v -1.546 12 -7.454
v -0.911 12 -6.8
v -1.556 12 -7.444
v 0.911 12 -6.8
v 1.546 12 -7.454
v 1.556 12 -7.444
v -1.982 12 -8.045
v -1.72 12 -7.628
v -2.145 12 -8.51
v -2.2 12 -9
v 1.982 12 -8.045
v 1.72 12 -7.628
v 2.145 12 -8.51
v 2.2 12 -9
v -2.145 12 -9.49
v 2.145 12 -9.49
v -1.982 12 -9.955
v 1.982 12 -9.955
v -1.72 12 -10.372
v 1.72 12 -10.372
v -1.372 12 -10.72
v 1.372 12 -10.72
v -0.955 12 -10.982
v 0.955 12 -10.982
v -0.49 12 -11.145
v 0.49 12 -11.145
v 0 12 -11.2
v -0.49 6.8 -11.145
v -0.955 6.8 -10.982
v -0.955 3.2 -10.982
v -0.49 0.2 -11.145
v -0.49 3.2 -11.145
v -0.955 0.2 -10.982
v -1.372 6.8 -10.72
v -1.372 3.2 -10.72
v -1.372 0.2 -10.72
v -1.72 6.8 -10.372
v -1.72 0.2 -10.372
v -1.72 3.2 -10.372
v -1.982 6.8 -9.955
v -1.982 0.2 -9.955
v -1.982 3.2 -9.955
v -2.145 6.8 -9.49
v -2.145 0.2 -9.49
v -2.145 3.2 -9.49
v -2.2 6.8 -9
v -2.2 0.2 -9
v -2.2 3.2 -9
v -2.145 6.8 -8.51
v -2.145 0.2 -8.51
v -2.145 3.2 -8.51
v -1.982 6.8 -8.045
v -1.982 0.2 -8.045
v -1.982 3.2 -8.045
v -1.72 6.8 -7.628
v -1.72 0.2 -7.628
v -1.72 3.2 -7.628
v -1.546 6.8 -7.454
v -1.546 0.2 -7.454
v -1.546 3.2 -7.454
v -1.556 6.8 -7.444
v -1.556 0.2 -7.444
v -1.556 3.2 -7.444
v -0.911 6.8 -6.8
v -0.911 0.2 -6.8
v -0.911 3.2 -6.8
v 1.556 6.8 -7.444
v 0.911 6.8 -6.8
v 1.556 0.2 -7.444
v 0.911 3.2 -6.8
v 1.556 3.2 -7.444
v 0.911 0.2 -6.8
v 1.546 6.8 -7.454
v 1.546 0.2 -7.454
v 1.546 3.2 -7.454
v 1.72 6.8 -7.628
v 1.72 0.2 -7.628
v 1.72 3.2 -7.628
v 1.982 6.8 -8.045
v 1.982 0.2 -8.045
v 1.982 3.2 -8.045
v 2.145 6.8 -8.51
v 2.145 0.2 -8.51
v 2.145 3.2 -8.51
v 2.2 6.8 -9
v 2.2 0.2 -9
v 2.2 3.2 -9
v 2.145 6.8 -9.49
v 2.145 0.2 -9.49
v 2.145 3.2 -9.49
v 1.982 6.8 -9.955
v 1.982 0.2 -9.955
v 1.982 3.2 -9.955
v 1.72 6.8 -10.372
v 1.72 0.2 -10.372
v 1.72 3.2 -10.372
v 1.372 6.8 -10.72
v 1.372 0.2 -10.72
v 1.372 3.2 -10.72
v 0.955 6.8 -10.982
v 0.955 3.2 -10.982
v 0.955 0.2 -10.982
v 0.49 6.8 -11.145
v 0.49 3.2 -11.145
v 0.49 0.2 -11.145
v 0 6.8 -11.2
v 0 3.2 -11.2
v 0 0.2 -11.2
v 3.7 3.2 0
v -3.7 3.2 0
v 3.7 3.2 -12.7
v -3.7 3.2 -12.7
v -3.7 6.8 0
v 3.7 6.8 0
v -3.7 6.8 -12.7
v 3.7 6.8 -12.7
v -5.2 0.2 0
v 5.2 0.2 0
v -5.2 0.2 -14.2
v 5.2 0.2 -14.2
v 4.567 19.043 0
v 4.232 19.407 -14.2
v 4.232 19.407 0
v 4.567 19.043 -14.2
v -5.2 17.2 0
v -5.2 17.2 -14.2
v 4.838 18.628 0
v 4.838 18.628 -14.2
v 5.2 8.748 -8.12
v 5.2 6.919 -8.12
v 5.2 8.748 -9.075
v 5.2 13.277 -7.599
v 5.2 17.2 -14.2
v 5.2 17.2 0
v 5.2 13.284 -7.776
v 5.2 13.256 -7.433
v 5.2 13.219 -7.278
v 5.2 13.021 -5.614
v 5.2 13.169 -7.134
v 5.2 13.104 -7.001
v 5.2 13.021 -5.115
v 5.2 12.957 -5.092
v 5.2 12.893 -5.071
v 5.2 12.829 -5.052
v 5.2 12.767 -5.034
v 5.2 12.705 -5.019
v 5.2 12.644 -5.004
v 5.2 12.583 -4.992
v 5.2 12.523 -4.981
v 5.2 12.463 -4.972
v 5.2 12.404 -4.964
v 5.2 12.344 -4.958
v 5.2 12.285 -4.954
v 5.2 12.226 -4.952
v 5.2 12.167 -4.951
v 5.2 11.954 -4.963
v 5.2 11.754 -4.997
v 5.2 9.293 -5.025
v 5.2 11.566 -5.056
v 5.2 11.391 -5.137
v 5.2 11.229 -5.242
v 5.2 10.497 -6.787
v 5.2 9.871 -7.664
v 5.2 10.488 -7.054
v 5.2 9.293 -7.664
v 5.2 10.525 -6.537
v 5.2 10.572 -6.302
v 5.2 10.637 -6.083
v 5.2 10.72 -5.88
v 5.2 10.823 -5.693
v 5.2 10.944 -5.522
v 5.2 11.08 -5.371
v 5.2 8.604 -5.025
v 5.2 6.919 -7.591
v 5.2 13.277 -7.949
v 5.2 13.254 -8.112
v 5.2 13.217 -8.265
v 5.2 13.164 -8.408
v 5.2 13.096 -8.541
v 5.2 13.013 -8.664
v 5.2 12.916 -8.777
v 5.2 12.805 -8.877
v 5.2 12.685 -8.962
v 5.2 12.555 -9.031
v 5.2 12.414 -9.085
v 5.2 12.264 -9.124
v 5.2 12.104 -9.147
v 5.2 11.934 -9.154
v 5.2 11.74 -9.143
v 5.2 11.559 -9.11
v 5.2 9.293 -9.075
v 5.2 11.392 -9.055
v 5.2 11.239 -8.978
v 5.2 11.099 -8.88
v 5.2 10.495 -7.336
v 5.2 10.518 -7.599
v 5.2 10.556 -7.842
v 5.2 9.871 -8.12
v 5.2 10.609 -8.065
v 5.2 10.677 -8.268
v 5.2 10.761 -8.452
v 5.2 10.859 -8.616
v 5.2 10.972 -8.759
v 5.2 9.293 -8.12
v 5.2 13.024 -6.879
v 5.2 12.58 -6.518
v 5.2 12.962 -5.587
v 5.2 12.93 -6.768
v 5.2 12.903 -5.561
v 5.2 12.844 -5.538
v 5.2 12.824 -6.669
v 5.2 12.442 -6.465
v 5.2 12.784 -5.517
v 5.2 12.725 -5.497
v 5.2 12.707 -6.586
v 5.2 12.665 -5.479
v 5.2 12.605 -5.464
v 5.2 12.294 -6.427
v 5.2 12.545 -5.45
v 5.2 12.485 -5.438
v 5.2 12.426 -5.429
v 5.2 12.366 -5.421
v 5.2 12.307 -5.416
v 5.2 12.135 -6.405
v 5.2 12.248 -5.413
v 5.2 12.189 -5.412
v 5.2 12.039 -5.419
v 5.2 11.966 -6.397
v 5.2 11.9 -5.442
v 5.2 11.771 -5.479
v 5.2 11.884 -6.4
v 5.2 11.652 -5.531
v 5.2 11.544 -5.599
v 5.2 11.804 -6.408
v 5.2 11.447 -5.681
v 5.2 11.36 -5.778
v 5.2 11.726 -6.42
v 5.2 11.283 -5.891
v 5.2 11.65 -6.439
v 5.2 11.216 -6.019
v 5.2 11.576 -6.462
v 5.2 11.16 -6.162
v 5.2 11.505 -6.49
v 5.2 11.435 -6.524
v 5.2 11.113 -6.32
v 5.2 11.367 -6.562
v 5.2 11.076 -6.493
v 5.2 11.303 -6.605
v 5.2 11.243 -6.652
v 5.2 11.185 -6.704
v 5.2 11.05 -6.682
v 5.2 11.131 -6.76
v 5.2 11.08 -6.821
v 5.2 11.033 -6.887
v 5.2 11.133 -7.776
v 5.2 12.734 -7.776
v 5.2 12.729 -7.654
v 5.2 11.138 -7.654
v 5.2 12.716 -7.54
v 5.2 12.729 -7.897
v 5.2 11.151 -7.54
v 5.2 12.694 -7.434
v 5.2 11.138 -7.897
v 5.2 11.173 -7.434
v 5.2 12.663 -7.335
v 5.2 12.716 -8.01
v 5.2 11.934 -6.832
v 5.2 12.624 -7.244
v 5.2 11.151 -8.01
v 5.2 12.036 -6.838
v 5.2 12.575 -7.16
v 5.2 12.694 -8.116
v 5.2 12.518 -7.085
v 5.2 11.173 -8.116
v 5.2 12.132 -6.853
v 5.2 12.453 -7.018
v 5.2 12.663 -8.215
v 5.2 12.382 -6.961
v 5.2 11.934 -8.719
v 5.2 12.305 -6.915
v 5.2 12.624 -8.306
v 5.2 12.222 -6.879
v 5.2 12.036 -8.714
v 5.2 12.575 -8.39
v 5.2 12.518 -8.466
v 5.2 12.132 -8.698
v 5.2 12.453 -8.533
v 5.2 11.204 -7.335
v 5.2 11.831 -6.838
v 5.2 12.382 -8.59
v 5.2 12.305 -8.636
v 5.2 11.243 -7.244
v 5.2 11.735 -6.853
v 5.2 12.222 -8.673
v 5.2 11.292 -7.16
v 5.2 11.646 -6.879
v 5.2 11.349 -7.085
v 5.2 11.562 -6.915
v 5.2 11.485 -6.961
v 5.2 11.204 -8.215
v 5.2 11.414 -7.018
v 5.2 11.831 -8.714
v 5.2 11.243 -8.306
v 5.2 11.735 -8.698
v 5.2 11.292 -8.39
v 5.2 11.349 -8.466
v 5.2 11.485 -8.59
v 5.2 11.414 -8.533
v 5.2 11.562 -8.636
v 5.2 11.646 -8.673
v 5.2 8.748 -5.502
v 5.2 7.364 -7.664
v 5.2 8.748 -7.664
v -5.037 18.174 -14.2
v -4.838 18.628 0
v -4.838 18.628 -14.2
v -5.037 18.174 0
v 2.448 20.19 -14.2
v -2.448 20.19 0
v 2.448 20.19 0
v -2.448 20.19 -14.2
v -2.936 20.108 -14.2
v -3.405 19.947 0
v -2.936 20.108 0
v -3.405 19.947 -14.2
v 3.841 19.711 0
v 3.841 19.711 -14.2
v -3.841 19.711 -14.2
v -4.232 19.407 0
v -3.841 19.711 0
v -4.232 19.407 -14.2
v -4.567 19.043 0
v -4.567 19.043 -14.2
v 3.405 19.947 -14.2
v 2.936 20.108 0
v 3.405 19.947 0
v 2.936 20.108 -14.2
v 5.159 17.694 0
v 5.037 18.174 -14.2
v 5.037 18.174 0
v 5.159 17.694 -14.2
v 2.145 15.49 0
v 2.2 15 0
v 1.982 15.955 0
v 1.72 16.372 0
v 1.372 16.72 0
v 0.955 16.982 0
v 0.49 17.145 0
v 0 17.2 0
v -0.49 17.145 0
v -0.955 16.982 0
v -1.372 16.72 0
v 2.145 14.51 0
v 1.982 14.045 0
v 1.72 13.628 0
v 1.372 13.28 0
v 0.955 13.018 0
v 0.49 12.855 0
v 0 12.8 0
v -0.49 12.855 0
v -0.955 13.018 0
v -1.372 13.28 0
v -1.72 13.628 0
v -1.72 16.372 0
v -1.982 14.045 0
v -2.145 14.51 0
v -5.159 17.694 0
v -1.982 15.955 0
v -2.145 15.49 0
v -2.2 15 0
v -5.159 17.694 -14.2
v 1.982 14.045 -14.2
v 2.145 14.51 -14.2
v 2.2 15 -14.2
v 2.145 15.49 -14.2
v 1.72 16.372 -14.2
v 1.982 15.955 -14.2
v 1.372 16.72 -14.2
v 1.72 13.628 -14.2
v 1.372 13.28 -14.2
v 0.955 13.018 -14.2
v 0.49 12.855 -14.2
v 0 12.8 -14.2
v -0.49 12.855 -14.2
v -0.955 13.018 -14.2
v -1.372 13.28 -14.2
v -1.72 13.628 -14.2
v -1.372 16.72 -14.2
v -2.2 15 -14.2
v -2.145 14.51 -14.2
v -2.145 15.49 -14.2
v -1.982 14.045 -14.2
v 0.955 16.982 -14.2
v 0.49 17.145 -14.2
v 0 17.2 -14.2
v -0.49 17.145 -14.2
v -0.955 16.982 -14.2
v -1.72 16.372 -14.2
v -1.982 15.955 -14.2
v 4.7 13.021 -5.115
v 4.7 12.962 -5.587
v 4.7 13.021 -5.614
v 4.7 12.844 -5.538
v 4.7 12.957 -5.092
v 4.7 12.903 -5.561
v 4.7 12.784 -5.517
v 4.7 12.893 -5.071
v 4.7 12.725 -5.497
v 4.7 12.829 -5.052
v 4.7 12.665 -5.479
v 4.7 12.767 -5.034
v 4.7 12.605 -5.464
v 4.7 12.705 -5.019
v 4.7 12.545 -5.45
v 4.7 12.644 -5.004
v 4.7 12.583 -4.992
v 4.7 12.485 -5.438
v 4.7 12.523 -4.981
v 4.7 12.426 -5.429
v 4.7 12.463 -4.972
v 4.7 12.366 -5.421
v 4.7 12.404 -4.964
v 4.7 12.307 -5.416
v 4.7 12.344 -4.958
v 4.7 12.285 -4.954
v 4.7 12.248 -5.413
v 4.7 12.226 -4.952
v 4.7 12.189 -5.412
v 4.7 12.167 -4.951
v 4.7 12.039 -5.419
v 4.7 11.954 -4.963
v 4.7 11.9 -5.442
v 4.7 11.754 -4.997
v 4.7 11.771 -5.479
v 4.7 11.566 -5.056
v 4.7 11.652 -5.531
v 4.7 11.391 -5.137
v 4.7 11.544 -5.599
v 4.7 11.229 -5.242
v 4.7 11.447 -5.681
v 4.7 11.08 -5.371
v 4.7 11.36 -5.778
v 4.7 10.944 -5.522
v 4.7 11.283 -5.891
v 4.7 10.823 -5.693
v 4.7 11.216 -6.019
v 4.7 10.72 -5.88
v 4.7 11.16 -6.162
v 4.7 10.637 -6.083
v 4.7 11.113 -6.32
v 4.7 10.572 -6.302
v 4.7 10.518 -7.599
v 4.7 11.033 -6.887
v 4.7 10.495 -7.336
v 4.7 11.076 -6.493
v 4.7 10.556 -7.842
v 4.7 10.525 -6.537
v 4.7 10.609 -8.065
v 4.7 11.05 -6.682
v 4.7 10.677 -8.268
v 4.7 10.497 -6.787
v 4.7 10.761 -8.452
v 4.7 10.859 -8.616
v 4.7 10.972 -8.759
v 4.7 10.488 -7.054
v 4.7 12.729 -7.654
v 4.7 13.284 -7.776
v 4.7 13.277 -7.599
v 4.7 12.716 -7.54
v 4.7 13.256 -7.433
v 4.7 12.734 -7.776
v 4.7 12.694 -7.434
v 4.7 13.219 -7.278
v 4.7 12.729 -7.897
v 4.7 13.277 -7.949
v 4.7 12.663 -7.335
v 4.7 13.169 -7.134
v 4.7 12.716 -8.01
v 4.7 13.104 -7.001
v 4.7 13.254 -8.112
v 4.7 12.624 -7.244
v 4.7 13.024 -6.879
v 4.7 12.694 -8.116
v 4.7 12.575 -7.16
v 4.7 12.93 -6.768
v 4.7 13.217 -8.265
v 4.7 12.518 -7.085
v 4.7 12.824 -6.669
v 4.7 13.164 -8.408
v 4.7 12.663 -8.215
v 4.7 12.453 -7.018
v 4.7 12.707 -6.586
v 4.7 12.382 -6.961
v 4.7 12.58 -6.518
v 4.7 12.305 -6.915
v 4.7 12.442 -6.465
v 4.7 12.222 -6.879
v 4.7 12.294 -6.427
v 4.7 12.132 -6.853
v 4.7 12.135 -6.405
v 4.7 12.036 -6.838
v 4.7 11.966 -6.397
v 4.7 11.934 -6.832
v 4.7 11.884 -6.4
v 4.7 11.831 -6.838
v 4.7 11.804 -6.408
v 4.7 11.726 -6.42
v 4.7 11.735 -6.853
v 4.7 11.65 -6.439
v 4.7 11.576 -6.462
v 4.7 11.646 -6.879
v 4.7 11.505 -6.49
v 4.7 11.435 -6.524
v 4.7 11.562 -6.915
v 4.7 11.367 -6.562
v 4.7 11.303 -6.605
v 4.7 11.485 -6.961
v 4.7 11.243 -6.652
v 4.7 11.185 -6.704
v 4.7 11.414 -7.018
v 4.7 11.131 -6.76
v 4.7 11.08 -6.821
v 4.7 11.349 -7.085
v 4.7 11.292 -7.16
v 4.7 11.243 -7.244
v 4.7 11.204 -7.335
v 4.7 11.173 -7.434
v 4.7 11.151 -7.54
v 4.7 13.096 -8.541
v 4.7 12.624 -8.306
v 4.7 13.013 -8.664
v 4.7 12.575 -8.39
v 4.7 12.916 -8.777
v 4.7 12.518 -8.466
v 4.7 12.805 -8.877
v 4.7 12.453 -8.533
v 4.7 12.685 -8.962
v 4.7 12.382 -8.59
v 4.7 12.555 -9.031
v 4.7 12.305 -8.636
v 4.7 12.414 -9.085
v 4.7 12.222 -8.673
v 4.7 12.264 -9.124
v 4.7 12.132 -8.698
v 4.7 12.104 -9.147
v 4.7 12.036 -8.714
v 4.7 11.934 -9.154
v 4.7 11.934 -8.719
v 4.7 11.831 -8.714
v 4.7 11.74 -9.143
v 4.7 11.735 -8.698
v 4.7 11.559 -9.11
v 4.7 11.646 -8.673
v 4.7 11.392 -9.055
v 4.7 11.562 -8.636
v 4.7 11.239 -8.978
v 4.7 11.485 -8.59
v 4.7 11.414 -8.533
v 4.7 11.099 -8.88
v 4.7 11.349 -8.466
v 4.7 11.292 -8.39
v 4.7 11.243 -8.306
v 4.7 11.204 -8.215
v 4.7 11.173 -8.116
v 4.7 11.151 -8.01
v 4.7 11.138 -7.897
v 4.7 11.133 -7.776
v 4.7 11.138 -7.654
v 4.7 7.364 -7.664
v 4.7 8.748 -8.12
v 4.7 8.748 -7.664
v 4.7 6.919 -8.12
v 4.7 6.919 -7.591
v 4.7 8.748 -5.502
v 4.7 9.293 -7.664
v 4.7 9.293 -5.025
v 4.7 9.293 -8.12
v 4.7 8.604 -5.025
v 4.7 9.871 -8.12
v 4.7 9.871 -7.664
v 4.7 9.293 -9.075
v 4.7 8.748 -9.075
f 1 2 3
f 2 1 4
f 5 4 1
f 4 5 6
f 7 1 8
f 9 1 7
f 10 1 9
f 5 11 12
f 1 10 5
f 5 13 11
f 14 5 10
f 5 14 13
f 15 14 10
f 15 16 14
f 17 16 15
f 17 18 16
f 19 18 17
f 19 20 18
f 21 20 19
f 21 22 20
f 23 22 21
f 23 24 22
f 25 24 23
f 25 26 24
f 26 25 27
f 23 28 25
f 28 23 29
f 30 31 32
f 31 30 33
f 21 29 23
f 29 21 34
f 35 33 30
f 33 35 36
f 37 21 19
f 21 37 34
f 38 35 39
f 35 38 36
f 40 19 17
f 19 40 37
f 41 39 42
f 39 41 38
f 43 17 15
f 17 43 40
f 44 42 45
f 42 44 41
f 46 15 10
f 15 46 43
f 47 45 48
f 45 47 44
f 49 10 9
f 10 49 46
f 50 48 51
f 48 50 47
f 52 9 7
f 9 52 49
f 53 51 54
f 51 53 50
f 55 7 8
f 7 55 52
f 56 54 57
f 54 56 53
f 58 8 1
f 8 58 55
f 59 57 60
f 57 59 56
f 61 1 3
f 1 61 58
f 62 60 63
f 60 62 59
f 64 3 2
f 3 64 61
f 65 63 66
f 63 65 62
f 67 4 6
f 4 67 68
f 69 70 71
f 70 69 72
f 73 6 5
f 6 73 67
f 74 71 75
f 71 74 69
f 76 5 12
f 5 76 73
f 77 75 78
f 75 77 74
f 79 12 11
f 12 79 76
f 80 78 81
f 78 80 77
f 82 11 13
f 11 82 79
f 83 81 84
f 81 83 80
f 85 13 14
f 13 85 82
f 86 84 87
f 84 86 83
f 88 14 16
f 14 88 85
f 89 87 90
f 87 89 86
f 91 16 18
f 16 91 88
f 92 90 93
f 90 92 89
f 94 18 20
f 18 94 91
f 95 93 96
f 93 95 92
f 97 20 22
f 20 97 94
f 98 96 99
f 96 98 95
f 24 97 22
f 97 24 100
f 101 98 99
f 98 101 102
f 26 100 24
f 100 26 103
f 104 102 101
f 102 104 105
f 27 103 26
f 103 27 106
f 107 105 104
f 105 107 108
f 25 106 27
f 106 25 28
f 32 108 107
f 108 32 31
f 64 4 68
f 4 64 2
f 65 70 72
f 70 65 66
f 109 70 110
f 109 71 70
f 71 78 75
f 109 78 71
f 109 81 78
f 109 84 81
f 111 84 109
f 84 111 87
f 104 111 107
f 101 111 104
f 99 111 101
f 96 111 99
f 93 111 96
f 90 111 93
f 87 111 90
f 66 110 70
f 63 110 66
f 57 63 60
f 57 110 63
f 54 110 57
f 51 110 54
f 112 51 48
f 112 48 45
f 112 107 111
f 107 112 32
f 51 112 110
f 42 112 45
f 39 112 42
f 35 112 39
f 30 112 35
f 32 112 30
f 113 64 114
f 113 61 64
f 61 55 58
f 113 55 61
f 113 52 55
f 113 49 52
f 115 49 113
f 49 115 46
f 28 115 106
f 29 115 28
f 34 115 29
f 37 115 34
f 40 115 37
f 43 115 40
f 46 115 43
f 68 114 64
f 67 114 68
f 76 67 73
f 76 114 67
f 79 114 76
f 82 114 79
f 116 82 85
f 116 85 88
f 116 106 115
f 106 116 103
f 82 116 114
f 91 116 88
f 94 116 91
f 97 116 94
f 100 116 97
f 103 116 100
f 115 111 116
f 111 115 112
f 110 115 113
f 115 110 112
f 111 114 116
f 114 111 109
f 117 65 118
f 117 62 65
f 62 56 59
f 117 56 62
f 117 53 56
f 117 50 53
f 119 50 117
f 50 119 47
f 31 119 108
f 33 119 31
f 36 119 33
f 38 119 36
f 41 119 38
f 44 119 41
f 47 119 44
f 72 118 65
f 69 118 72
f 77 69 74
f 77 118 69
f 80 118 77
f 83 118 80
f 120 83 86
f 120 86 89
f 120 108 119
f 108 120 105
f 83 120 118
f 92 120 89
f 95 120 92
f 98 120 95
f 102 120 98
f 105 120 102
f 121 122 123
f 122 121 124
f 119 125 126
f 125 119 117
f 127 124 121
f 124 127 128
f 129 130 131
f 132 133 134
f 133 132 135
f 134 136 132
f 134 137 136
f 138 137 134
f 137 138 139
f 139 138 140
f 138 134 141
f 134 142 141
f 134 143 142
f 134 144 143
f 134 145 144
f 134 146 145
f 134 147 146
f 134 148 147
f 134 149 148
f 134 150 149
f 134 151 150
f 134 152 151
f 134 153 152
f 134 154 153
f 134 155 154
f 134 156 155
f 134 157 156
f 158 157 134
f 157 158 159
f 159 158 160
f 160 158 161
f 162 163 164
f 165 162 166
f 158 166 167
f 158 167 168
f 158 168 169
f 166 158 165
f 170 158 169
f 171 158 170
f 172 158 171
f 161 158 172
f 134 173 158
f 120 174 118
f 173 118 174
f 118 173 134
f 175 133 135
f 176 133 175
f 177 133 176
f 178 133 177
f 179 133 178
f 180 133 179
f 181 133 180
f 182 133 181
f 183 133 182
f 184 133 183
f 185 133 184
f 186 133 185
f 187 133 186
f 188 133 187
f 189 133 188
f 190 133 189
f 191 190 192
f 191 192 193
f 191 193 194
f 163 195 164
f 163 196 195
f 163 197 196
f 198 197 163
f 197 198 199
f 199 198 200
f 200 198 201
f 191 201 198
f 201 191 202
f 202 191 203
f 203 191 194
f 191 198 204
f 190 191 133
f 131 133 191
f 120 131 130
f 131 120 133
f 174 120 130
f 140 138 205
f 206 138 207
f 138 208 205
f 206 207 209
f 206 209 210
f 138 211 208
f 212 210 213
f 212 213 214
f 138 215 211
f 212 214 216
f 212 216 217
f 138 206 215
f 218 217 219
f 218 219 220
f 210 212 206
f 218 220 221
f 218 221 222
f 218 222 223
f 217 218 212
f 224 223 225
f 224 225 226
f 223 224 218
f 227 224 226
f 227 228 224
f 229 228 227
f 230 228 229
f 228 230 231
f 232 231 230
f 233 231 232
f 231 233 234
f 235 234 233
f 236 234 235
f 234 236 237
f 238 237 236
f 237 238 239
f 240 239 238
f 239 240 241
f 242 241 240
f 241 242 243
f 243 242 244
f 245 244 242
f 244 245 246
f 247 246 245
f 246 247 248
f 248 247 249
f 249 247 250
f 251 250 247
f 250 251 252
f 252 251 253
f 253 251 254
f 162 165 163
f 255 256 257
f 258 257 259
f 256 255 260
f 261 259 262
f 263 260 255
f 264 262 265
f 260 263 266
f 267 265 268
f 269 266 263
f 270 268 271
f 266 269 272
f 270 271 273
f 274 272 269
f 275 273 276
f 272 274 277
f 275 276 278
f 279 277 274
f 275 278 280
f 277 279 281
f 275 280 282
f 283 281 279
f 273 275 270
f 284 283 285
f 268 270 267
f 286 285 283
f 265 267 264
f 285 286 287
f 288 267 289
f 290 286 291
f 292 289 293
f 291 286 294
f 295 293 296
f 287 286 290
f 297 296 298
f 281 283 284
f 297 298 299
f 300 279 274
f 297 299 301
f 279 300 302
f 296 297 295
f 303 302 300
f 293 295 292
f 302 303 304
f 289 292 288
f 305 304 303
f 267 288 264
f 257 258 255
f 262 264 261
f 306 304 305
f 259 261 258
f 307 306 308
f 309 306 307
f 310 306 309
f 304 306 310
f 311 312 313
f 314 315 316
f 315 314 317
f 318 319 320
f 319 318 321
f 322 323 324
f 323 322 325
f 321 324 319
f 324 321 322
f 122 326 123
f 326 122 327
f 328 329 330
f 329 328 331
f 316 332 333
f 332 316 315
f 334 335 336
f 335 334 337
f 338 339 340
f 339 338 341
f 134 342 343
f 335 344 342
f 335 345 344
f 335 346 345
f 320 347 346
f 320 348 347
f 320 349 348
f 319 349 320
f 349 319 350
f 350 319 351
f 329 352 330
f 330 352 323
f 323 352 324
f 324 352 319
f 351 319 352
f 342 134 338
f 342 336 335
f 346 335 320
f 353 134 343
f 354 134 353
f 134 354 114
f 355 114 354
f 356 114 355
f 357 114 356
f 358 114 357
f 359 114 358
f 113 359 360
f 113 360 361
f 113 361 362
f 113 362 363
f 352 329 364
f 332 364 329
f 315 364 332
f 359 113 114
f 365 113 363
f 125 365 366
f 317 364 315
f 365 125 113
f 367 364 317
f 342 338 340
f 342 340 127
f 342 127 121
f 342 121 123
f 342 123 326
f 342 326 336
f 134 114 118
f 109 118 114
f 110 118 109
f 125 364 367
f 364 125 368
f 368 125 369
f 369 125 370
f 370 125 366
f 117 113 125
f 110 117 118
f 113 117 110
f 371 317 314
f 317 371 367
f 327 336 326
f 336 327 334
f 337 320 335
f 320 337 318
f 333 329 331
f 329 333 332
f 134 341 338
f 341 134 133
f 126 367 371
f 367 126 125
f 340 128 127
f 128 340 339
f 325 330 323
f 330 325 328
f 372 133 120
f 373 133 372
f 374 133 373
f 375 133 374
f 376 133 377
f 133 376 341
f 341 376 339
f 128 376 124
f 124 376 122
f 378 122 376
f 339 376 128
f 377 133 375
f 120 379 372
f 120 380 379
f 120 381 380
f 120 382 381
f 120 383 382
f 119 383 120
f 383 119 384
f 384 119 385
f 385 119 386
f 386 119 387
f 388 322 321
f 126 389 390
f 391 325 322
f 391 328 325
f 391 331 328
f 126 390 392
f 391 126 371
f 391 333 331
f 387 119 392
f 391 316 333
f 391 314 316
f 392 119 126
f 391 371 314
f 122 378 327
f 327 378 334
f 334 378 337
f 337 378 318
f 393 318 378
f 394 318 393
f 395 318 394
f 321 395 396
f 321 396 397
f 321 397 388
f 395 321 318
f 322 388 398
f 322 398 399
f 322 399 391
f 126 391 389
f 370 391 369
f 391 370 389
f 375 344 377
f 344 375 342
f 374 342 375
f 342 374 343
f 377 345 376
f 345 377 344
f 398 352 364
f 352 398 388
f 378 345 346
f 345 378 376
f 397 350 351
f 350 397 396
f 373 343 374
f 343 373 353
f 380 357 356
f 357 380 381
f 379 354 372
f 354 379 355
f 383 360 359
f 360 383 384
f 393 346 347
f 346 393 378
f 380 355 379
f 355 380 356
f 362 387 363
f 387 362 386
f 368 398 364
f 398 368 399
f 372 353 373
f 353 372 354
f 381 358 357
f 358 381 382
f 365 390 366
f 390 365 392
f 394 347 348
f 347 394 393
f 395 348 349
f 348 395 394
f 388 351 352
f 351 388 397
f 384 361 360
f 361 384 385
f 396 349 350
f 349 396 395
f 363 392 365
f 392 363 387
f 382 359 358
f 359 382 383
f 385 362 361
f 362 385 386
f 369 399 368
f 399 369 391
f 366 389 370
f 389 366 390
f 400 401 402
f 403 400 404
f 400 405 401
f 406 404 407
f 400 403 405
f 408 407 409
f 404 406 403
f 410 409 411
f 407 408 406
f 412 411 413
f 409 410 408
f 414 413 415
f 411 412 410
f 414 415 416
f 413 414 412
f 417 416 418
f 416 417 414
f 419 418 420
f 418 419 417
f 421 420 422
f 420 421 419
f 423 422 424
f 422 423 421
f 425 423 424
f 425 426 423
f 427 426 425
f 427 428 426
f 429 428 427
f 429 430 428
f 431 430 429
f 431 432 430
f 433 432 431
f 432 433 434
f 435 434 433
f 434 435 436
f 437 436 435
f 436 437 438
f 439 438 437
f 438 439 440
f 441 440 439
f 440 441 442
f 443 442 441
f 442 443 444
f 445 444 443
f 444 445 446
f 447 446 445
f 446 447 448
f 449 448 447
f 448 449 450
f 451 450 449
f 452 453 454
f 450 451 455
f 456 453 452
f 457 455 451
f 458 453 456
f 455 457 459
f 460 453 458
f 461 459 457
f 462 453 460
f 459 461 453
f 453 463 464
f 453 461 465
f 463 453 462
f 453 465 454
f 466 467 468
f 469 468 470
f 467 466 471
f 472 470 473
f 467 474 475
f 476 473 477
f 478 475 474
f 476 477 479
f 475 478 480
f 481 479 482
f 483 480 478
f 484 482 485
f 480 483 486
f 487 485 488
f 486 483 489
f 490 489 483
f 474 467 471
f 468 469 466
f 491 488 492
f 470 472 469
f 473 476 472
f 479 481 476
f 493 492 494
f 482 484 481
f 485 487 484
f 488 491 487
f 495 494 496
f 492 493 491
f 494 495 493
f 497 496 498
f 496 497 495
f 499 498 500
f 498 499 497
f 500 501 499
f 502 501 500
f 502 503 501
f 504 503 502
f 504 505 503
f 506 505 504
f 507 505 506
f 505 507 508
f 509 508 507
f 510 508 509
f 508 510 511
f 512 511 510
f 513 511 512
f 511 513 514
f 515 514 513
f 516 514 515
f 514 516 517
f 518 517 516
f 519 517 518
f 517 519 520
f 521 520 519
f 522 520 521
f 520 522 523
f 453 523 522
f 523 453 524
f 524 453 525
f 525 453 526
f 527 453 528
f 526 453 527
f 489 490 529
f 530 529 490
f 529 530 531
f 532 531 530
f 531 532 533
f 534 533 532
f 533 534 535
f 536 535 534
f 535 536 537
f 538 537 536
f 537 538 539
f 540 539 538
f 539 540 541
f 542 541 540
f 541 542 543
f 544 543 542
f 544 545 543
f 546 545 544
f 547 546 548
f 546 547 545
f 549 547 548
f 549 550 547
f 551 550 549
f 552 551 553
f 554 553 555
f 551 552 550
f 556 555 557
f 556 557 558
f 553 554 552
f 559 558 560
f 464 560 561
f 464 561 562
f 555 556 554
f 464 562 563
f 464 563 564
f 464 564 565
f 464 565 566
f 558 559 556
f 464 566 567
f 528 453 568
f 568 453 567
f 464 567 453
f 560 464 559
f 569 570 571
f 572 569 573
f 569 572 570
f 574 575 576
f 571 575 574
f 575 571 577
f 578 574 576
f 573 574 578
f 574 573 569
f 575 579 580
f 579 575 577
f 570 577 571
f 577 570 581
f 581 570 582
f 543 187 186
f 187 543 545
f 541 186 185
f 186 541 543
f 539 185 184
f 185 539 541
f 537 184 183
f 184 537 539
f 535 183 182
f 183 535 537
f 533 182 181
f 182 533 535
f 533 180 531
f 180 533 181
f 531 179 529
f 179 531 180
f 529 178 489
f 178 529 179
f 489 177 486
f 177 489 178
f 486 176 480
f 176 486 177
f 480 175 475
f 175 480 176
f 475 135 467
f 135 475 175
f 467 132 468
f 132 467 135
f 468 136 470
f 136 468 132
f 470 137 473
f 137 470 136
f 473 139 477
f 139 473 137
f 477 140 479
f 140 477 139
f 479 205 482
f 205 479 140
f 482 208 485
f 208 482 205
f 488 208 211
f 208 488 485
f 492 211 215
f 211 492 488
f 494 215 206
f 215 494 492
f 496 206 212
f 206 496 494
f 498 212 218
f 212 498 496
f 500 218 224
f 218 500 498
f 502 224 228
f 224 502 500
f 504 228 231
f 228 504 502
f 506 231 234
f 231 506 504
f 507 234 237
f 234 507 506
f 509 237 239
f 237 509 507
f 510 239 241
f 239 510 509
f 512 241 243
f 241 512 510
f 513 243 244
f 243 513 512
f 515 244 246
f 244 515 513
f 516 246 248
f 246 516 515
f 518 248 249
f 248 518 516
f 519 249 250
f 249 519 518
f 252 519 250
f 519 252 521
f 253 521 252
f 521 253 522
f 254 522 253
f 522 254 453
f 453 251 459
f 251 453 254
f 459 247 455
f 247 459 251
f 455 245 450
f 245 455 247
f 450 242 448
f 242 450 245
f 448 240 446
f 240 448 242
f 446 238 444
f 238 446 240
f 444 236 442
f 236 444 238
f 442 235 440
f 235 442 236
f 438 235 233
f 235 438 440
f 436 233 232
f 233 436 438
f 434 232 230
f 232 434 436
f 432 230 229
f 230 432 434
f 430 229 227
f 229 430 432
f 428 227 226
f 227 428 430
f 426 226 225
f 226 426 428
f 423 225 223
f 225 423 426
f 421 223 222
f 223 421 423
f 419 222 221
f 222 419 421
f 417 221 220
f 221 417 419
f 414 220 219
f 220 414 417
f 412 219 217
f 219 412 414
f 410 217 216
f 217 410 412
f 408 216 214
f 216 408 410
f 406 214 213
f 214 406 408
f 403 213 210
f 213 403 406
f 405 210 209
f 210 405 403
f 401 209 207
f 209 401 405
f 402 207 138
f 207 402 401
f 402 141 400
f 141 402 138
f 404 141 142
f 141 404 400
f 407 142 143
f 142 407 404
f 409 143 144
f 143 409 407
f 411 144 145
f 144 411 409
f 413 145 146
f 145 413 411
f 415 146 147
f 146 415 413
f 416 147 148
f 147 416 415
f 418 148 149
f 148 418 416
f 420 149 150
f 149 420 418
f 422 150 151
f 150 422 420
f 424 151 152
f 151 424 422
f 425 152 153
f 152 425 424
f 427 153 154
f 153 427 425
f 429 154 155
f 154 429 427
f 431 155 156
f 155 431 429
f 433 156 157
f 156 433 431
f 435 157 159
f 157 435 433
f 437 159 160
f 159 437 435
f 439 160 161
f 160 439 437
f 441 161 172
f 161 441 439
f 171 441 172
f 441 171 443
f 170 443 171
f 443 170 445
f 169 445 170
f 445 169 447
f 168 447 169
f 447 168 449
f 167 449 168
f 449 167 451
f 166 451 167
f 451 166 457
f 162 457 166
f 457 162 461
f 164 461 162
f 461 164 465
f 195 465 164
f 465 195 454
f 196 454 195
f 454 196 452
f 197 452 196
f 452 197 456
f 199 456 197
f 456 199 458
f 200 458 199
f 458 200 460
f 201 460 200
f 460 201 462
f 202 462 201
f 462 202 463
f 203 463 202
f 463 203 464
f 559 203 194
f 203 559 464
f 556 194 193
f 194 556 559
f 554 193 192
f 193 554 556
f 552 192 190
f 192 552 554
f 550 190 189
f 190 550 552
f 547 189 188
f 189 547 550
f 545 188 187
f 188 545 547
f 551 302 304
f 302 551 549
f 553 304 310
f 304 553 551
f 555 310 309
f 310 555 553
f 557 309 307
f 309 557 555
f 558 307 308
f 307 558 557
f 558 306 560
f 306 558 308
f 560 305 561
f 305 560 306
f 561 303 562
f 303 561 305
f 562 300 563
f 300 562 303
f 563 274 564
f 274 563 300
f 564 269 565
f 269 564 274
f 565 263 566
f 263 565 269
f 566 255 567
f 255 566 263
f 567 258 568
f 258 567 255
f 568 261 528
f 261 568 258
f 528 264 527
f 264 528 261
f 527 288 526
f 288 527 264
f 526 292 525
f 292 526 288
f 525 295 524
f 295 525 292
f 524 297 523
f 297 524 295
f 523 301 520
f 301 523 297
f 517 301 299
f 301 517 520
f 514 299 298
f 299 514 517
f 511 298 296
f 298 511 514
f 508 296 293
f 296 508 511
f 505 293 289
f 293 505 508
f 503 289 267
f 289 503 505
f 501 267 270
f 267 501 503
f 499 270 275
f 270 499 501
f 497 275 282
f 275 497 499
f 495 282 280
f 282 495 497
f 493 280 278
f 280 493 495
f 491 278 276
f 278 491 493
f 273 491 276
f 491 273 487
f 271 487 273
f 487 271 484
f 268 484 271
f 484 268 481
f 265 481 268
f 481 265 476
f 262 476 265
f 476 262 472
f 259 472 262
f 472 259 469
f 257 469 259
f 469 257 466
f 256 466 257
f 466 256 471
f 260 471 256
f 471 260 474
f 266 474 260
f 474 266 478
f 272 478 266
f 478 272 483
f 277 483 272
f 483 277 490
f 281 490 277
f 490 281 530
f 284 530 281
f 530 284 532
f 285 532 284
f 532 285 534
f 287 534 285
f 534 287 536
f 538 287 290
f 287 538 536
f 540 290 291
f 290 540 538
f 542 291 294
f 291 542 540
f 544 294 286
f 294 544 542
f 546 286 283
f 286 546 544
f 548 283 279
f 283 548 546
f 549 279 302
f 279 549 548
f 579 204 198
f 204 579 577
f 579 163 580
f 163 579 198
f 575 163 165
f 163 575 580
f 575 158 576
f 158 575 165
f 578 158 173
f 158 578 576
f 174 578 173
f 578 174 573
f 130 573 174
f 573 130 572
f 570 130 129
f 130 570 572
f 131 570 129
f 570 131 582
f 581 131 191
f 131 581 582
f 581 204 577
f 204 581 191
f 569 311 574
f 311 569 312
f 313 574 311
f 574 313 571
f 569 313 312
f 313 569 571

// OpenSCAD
/*******************************************************************

This OpenSCAD code and its rendered 3D model are part of the

	Kühling&Kühling RepRap Industrial 3D Printer


All details, BOM, assembling instructions and latest sources:
	http://kuehlingkuehling.de

Designed and developed by:
	Jonas Kühling <mail@jonaskuehling.de>
	Simon Kühling <mail@simonkuehling.de>

License:
	Creative Commons Attribution-ShareAlike 4.0 International (CC BY-SA 4.0)
	https://creativecommons.org/licenses/by-sa/4.0/

*******************************************************************/

include <configuration.scad>





// RENDERING
difference(){
	frame_enclosure_angle();
    translate([frame_enclosure_angle_body_width/2,frame_enclosure_angle_body_length/2,-frame_enclosure_angle_body_height/2])
        label("46",orientation="right");
}





module frame_enclosure_angle(){
	difference(){

		// main body
		hull(){
			translate([-frame_enclosure_angle_body_width/2+wall,frame_enclosure_angle_body_length-wall,-frame_enclosure_angle_body_height])
				cylinder(r=wall,h=frame_enclosure_angle_body_height);
			translate([frame_enclosure_angle_body_width/2-wall,frame_enclosure_angle_body_length-wall,-frame_enclosure_angle_body_height])
				cylinder(r=wall,h=frame_enclosure_angle_body_height);
			translate([-frame_enclosure_angle_body_width/2,clearance,-frame_enclosure_angle_body_height])
				cube([frame_enclosure_angle_body_width,wall,frame_enclosure_angle_body_height]);
		}

		// frame screw hole
		translate([0,frame_width/2,-frame_enclosure_angle_body_height-1])
			cylinder(r=frame_screw_dia/2+clearance,h=frame_enclosure_angle_body_height+2);

		// frame base enclosure screw hole and nut trap
		translate([0,clearance+(frame_enclosure_angle_body_length-wall-clearance-frame_screw_dia-clearance-wall_thin+1)/2-1,frame_enclosure_thickness-frame_width/2])
			rotate([0,0,90])
				teardrop(frame_screw_dia/2+clearance,frame_enclosure_angle_body_length-wall-clearance-frame_screw_dia-clearance-wall_thin+1);
		translate([0,clearance+(frame_screw_nut_height+2*clearance)/2+wall,frame_enclosure_thickness-frame_width/2])
			rotate([0,0,90])
				nut_slot_square(frame_screw_nut_wrench,frame_screw_nut_height,frame_enclosure_angle_body_width,vertical=1);
	}
}
